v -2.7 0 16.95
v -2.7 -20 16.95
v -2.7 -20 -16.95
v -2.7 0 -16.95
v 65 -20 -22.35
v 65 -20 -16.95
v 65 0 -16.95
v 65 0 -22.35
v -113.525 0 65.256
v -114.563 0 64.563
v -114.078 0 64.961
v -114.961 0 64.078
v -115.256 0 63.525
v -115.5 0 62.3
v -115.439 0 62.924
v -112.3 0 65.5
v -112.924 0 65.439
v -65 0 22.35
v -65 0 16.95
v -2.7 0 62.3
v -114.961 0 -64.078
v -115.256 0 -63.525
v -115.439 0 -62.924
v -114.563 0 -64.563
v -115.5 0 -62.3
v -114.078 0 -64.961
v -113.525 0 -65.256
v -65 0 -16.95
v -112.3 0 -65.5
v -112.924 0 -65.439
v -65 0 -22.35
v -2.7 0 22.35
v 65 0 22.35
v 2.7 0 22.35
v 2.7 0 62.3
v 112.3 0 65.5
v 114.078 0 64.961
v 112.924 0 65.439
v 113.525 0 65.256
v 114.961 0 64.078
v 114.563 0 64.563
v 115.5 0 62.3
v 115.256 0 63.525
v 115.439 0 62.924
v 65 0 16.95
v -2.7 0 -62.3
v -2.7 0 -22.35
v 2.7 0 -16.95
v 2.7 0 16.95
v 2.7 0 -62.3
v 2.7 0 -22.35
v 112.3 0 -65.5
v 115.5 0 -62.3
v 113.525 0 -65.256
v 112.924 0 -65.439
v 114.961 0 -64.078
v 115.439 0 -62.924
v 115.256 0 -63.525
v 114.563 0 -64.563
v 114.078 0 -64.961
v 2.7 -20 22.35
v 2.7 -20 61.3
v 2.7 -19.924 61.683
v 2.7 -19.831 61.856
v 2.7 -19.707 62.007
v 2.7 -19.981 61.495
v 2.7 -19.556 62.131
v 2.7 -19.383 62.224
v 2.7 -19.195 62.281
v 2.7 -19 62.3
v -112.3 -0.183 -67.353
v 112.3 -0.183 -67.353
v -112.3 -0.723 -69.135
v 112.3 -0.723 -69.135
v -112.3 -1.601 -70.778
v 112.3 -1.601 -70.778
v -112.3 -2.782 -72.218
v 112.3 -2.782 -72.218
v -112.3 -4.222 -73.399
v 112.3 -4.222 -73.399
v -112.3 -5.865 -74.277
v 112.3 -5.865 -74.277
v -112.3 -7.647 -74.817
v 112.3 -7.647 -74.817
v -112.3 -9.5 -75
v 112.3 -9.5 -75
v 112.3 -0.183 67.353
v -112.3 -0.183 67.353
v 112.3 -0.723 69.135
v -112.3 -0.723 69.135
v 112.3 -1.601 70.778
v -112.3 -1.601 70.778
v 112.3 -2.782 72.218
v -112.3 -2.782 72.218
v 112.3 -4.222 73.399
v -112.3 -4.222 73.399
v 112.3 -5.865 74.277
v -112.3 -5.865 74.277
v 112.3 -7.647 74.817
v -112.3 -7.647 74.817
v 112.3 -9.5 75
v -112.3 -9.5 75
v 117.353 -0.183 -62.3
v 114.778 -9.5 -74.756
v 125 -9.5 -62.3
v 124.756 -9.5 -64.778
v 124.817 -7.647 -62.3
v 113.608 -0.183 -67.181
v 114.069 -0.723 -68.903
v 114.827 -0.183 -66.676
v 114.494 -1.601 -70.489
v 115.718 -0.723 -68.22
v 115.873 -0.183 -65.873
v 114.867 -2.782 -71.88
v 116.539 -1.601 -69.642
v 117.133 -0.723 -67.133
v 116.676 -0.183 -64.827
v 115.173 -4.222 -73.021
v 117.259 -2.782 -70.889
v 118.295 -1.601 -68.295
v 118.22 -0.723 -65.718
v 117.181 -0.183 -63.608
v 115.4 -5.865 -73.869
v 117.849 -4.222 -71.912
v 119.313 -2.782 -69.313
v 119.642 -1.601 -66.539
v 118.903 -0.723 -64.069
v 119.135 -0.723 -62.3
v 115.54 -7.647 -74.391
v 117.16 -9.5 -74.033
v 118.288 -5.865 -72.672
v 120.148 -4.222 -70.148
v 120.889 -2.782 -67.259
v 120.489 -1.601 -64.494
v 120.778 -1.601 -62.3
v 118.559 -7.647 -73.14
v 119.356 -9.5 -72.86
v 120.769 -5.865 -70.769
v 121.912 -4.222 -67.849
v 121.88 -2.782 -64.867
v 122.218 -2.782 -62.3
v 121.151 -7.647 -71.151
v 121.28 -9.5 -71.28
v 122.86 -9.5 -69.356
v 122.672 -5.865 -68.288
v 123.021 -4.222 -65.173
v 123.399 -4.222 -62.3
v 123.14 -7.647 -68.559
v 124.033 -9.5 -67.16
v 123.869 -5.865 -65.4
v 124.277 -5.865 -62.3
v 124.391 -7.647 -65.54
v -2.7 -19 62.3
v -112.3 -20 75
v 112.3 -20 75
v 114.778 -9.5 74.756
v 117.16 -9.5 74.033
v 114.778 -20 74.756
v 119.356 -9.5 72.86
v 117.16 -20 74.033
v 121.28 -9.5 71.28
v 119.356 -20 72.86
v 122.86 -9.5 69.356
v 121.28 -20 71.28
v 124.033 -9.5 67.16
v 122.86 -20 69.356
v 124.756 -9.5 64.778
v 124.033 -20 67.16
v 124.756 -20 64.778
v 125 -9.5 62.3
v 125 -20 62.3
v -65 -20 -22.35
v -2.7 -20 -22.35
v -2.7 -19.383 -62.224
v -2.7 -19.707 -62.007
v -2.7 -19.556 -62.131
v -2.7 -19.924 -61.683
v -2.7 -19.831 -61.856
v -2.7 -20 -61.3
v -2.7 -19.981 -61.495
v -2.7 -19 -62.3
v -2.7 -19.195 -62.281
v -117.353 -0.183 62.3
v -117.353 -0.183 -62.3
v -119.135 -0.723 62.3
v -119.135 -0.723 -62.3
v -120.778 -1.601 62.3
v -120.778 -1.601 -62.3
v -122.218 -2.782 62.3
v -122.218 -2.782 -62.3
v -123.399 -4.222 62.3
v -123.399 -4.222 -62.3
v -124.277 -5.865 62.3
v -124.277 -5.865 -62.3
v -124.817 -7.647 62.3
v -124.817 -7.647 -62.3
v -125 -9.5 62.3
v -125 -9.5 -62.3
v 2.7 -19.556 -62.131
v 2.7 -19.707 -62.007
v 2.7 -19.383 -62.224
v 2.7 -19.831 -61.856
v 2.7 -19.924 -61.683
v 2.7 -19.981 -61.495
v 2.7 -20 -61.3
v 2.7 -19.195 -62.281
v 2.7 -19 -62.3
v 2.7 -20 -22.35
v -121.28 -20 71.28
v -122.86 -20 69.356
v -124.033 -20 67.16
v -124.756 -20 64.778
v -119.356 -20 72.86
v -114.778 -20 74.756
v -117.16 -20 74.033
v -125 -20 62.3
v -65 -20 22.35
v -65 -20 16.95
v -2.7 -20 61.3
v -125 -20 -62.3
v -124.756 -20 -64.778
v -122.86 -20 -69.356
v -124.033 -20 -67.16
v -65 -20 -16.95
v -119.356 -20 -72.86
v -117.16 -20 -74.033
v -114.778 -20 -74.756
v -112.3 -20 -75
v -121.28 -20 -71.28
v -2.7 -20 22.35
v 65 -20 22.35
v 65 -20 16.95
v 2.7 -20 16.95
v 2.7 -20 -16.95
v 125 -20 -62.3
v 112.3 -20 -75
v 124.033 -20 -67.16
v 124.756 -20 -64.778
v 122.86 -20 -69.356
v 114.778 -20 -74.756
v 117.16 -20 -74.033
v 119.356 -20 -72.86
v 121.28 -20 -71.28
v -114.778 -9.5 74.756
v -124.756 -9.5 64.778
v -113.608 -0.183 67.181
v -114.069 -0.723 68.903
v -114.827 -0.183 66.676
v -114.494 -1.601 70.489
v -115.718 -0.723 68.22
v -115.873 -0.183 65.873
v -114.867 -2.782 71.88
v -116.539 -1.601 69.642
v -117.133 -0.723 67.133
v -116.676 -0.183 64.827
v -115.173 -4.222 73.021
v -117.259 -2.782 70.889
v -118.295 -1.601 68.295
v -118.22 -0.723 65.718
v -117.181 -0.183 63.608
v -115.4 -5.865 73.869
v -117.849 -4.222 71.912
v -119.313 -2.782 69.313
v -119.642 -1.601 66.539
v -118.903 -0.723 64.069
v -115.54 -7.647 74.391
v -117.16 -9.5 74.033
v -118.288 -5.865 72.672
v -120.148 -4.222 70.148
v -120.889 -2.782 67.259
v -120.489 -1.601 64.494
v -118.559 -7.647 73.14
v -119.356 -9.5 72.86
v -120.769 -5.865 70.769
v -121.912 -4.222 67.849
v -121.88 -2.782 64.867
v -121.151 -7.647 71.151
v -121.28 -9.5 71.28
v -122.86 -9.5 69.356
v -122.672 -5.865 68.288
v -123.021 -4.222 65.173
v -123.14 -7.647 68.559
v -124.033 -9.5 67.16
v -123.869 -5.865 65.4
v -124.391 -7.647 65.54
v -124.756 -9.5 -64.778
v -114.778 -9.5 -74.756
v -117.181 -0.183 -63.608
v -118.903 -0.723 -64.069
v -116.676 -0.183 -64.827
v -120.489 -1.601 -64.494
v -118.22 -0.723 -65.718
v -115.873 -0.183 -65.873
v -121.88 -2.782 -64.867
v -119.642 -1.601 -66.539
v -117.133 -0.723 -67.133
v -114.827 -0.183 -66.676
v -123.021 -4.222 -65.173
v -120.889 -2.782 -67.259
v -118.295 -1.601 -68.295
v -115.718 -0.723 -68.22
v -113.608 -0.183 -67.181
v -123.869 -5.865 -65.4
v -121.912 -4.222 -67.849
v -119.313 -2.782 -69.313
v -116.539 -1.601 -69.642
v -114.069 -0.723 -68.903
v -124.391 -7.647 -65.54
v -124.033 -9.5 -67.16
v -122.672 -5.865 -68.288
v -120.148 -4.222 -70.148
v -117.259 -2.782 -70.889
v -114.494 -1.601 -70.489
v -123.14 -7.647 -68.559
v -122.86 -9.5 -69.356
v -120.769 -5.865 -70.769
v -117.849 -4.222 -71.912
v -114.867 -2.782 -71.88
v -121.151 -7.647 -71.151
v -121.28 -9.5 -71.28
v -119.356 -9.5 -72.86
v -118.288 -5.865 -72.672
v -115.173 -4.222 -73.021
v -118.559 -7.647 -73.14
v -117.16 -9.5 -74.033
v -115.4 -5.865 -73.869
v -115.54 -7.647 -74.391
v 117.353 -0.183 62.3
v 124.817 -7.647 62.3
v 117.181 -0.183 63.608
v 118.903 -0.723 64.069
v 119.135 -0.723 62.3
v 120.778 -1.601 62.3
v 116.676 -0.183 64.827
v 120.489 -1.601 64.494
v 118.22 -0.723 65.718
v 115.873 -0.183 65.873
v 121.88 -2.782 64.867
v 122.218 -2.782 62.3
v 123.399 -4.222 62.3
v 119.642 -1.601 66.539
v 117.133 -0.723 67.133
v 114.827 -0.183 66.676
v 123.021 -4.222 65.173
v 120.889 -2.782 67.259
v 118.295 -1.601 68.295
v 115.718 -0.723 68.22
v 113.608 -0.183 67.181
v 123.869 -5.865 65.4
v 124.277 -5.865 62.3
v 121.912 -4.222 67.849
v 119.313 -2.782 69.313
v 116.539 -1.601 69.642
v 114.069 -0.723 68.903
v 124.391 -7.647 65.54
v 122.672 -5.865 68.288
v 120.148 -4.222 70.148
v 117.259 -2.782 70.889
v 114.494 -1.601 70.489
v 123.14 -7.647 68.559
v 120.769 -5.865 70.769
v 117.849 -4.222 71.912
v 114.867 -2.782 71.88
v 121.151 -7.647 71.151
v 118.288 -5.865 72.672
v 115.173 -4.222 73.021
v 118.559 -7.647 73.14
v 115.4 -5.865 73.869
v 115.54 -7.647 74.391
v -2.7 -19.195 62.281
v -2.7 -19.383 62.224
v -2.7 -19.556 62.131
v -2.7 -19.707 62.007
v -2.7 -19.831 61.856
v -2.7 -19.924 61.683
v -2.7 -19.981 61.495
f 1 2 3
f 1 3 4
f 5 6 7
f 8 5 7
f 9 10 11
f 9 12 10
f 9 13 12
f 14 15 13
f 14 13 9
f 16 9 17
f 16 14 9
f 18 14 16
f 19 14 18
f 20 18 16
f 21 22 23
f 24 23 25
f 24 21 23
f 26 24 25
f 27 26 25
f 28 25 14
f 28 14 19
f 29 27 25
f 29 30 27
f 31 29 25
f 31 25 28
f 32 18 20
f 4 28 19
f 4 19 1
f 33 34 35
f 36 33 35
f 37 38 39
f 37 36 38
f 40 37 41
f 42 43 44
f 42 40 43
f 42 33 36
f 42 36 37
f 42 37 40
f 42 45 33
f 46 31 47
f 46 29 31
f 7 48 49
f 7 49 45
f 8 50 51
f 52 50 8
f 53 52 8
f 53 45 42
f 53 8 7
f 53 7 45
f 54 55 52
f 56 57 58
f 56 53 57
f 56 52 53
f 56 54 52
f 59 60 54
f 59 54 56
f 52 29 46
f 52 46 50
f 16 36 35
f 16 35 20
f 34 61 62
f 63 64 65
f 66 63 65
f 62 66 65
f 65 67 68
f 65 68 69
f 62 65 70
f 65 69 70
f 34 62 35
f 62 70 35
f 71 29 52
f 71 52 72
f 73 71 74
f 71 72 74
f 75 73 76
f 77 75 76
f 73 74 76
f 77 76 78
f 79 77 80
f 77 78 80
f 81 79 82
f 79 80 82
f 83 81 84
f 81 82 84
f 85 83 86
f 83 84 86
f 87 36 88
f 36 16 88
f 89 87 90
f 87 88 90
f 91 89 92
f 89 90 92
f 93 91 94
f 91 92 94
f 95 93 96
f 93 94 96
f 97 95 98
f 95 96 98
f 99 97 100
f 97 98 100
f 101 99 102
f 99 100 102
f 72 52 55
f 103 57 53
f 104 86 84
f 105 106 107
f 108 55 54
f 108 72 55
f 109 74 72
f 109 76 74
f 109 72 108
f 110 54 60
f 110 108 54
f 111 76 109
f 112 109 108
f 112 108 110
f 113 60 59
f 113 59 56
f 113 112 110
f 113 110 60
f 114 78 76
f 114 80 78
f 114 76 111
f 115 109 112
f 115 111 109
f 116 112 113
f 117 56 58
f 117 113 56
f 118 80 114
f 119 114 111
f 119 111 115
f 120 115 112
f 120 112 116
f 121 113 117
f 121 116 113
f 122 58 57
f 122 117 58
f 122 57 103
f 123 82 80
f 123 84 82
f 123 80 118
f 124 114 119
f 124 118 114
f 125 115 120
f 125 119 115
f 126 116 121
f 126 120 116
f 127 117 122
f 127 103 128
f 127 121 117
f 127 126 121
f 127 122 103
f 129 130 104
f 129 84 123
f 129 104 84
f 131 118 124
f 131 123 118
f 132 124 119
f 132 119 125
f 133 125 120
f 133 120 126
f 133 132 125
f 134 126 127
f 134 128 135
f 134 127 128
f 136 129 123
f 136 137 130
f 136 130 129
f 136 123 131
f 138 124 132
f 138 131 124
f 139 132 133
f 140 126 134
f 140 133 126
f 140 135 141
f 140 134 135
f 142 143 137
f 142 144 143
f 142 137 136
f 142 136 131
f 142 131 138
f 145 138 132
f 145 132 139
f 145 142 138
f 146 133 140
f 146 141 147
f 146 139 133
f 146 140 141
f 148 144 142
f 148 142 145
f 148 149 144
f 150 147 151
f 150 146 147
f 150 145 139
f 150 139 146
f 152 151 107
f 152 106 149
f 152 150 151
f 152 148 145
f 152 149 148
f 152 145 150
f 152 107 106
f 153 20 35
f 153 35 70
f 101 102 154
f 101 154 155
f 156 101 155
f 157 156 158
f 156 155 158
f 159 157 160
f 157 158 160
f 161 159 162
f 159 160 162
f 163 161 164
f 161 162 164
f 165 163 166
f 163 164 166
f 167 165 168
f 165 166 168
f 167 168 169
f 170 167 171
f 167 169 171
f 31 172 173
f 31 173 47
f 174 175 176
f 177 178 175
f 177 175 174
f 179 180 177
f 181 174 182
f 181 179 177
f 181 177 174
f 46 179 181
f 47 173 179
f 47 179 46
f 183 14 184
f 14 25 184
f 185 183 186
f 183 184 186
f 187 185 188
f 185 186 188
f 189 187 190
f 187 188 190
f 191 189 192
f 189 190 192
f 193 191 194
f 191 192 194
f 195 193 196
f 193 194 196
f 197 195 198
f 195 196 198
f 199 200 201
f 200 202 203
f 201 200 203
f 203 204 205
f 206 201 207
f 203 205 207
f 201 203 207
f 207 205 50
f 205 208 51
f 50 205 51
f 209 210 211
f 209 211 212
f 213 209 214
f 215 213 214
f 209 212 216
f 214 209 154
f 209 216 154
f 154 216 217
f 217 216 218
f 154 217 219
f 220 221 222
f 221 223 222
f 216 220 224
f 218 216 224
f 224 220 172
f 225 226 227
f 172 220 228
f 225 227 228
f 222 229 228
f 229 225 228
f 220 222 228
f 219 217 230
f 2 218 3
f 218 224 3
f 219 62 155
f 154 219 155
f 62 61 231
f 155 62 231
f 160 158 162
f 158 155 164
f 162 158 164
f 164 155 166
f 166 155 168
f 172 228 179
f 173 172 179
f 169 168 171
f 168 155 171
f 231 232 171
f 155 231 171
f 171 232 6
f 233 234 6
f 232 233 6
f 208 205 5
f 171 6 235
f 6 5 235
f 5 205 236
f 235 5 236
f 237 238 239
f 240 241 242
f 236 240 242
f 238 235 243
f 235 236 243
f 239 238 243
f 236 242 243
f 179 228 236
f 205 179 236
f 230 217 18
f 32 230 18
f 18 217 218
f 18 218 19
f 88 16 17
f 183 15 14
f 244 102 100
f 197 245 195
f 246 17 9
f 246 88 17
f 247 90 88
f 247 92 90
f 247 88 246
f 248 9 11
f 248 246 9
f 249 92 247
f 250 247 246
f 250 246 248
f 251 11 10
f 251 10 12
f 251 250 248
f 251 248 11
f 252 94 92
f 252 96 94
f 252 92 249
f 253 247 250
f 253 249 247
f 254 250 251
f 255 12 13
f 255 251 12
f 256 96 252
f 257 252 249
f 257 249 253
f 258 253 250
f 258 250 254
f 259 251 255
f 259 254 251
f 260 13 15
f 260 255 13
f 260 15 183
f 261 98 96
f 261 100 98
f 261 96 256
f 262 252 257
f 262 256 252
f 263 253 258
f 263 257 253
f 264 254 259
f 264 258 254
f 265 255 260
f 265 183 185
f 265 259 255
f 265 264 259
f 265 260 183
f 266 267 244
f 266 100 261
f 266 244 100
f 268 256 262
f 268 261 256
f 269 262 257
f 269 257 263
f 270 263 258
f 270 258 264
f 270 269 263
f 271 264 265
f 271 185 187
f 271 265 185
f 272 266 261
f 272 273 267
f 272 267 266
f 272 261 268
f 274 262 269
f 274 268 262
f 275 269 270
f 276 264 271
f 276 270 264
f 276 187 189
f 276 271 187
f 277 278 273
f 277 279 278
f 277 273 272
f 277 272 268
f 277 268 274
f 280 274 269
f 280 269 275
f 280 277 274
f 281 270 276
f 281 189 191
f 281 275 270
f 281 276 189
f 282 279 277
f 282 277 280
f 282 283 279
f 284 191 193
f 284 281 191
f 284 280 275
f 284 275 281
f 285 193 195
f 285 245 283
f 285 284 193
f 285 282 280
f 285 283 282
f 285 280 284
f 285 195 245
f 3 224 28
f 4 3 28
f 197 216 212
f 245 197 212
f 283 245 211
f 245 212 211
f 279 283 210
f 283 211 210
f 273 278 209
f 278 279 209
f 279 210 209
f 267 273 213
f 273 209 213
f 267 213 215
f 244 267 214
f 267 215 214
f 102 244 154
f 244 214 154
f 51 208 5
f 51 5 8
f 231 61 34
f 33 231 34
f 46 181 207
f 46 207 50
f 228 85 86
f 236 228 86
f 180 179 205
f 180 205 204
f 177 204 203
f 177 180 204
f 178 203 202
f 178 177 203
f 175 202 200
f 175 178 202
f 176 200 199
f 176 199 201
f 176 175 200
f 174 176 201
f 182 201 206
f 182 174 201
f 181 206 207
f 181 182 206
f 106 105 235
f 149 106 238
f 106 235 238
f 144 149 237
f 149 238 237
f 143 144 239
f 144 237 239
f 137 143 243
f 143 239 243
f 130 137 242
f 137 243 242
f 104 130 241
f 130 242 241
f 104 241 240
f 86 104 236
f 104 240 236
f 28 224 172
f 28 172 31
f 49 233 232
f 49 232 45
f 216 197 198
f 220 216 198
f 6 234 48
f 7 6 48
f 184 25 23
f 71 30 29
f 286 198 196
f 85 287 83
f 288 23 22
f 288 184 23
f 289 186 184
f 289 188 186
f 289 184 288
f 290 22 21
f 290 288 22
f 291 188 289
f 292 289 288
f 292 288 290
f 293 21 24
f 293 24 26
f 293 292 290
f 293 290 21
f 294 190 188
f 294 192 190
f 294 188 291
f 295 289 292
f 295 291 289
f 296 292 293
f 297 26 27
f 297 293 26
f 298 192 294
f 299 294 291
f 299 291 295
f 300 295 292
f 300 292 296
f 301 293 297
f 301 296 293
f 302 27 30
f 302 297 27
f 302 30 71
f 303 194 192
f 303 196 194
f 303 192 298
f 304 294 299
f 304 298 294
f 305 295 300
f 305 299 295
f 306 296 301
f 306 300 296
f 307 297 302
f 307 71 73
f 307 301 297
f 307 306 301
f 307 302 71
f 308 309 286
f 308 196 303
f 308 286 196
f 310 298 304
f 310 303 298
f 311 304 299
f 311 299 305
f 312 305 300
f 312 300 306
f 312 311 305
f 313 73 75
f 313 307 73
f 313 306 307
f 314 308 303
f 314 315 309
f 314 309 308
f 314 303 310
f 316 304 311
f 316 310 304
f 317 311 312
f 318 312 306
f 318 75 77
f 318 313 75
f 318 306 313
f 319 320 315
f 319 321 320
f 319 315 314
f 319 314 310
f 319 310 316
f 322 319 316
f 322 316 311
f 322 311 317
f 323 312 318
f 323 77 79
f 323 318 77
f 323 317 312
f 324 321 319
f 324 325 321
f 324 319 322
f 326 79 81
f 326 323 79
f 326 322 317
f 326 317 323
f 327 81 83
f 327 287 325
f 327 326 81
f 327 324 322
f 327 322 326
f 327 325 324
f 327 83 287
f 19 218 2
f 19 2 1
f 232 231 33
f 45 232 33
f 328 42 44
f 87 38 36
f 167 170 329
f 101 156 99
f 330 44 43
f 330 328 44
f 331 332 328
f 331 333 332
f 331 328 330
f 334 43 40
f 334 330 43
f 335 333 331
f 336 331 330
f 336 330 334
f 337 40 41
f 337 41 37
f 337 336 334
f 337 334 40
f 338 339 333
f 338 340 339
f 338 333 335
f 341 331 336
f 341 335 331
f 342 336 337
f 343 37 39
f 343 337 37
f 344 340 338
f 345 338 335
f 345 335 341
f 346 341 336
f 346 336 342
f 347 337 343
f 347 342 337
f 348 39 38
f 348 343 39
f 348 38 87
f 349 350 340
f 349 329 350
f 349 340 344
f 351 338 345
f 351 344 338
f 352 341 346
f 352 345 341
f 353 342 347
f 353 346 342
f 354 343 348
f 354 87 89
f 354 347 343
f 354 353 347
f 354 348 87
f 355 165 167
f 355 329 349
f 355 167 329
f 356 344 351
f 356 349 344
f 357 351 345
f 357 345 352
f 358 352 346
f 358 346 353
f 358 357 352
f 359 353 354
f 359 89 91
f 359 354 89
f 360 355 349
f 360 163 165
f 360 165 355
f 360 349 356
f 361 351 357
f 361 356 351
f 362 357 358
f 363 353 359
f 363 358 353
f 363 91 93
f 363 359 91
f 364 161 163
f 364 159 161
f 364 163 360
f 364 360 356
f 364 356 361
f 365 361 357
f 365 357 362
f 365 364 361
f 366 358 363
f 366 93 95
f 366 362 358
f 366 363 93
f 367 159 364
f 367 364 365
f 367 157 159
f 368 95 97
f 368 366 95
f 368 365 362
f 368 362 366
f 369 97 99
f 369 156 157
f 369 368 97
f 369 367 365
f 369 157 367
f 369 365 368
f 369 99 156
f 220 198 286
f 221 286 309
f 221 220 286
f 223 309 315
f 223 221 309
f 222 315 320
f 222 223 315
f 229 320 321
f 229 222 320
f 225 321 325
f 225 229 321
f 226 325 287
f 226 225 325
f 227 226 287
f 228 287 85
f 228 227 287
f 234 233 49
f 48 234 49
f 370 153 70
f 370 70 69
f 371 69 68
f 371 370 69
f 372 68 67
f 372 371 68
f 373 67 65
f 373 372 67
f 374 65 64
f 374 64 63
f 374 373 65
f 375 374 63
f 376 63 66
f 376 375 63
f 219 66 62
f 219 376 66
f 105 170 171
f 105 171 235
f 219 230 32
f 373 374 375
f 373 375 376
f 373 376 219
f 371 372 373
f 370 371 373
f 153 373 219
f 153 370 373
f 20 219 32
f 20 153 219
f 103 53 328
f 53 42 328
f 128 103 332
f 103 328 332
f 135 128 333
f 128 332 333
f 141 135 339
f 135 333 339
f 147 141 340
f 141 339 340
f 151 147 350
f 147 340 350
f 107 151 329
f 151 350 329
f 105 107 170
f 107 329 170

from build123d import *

# Parameters (mm, degrees)
SKETCH1_W           = 250
SKETCH1_H           = 150
BOSS_EXTRUDE1_DEPTH = 20
FILLET1_R           = 12.7
FILLET2_R           = 9.5
CAVITY1_START       = -65
CAVITY1_OUTLINE_W   = 20
CAVITY1_OUTLINE_H   = 5.4
CAVITY1_DEPTH       = 130
CAVITY1_START_2     = -2.7
CAVITY1_2_OUTLINE_W = 20
CAVITY1_2_OUTLINE_H = 33.9
CAVITY1_2_DEPTH     = 5.4


# Read off the part's stored shape, not the designer's step: Cavity1
with BuildPart() as part:
    # Sketch1 → Boss-Extrude1 (new body)
    with BuildSketch(Plane(origin=(0, 0, 0), x_dir=(1, 0, 0), z_dir=(0, 1, 0))):
        Rectangle(SKETCH1_W, SKETCH1_H)
    extrude(amount=-BOSS_EXTRUDE1_DEPTH)

    # Fillet1
    fillet1_edges = [part.edges().sort_by_distance(p)[0] for p in [
        (125, -10, 75),
        (-125, -10, 75),
        (-125, -10, -75),
        (125, -10, -75),
    ]]
    fillet(fillet1_edges, radius=FILLET1_R)

    # Fillet2
    fillet2_edges = [part.edges().sort_by_distance(p)[0] for p in [
        (0, 0, -75),
        (125, 0, 0),
        (-125, 0, 0),
        (0, 0, 75),
        (121.280256121, 0, 71.280256121),
        (-121.280256121, 0, 71.280256121),
        (121.280256121, 0, -71.280256121),
        (-121.280256121, 0, -71.280256121),
    ]]
    fillet(fillet2_edges, radius=FILLET2_R)

    # Cavity1 outline → Cavity1 (cut)
    with BuildSketch(Plane.YZ.offset(CAVITY1_START)):
        with Locations((-10, 19.65)):
            Rectangle(CAVITY1_OUTLINE_W, CAVITY1_OUTLINE_H)
        with Locations((-10, -19.65)):
            Rectangle(CAVITY1_OUTLINE_W, CAVITY1_OUTLINE_H)
    extrude(amount=CAVITY1_DEPTH, mode=Mode.SUBTRACT)

    # Cavity1 2 outline → Cavity1 2 (cut)
    with BuildSketch(Plane.YZ.offset(CAVITY1_START_2)):
        with Locations((-10, 0)):
            Rectangle(CAVITY1_2_OUTLINE_W, CAVITY1_2_OUTLINE_H)
        with BuildLine():
            Line((-20, 22.35), (0, 22.35))
            Line((0, 22.35), (0, 62.3))
            Line((0, 62.3), (-19, 62.3))
            ThreePointArc((-19, 62.3), (-19.707106781, 62.007106781), (-20, 61.3))
            Line((-20, 61.3), (-20, 22.35))
        make_face()
        with BuildLine():
            Line((0, -62.3), (0, -22.35))
            Line((0, -22.35), (-20, -22.35))
            Line((-20, -22.35), (-20, -61.3))
            ThreePointArc((-20, -61.3), (-19.707106781, -62.007106781), (-19, -62.3))
            Line((-19, -62.3), (0, -62.3))
        make_face()
    extrude(amount=CAVITY1_2_DEPTH, mode=Mode.SUBTRACT)


solid = part.part
